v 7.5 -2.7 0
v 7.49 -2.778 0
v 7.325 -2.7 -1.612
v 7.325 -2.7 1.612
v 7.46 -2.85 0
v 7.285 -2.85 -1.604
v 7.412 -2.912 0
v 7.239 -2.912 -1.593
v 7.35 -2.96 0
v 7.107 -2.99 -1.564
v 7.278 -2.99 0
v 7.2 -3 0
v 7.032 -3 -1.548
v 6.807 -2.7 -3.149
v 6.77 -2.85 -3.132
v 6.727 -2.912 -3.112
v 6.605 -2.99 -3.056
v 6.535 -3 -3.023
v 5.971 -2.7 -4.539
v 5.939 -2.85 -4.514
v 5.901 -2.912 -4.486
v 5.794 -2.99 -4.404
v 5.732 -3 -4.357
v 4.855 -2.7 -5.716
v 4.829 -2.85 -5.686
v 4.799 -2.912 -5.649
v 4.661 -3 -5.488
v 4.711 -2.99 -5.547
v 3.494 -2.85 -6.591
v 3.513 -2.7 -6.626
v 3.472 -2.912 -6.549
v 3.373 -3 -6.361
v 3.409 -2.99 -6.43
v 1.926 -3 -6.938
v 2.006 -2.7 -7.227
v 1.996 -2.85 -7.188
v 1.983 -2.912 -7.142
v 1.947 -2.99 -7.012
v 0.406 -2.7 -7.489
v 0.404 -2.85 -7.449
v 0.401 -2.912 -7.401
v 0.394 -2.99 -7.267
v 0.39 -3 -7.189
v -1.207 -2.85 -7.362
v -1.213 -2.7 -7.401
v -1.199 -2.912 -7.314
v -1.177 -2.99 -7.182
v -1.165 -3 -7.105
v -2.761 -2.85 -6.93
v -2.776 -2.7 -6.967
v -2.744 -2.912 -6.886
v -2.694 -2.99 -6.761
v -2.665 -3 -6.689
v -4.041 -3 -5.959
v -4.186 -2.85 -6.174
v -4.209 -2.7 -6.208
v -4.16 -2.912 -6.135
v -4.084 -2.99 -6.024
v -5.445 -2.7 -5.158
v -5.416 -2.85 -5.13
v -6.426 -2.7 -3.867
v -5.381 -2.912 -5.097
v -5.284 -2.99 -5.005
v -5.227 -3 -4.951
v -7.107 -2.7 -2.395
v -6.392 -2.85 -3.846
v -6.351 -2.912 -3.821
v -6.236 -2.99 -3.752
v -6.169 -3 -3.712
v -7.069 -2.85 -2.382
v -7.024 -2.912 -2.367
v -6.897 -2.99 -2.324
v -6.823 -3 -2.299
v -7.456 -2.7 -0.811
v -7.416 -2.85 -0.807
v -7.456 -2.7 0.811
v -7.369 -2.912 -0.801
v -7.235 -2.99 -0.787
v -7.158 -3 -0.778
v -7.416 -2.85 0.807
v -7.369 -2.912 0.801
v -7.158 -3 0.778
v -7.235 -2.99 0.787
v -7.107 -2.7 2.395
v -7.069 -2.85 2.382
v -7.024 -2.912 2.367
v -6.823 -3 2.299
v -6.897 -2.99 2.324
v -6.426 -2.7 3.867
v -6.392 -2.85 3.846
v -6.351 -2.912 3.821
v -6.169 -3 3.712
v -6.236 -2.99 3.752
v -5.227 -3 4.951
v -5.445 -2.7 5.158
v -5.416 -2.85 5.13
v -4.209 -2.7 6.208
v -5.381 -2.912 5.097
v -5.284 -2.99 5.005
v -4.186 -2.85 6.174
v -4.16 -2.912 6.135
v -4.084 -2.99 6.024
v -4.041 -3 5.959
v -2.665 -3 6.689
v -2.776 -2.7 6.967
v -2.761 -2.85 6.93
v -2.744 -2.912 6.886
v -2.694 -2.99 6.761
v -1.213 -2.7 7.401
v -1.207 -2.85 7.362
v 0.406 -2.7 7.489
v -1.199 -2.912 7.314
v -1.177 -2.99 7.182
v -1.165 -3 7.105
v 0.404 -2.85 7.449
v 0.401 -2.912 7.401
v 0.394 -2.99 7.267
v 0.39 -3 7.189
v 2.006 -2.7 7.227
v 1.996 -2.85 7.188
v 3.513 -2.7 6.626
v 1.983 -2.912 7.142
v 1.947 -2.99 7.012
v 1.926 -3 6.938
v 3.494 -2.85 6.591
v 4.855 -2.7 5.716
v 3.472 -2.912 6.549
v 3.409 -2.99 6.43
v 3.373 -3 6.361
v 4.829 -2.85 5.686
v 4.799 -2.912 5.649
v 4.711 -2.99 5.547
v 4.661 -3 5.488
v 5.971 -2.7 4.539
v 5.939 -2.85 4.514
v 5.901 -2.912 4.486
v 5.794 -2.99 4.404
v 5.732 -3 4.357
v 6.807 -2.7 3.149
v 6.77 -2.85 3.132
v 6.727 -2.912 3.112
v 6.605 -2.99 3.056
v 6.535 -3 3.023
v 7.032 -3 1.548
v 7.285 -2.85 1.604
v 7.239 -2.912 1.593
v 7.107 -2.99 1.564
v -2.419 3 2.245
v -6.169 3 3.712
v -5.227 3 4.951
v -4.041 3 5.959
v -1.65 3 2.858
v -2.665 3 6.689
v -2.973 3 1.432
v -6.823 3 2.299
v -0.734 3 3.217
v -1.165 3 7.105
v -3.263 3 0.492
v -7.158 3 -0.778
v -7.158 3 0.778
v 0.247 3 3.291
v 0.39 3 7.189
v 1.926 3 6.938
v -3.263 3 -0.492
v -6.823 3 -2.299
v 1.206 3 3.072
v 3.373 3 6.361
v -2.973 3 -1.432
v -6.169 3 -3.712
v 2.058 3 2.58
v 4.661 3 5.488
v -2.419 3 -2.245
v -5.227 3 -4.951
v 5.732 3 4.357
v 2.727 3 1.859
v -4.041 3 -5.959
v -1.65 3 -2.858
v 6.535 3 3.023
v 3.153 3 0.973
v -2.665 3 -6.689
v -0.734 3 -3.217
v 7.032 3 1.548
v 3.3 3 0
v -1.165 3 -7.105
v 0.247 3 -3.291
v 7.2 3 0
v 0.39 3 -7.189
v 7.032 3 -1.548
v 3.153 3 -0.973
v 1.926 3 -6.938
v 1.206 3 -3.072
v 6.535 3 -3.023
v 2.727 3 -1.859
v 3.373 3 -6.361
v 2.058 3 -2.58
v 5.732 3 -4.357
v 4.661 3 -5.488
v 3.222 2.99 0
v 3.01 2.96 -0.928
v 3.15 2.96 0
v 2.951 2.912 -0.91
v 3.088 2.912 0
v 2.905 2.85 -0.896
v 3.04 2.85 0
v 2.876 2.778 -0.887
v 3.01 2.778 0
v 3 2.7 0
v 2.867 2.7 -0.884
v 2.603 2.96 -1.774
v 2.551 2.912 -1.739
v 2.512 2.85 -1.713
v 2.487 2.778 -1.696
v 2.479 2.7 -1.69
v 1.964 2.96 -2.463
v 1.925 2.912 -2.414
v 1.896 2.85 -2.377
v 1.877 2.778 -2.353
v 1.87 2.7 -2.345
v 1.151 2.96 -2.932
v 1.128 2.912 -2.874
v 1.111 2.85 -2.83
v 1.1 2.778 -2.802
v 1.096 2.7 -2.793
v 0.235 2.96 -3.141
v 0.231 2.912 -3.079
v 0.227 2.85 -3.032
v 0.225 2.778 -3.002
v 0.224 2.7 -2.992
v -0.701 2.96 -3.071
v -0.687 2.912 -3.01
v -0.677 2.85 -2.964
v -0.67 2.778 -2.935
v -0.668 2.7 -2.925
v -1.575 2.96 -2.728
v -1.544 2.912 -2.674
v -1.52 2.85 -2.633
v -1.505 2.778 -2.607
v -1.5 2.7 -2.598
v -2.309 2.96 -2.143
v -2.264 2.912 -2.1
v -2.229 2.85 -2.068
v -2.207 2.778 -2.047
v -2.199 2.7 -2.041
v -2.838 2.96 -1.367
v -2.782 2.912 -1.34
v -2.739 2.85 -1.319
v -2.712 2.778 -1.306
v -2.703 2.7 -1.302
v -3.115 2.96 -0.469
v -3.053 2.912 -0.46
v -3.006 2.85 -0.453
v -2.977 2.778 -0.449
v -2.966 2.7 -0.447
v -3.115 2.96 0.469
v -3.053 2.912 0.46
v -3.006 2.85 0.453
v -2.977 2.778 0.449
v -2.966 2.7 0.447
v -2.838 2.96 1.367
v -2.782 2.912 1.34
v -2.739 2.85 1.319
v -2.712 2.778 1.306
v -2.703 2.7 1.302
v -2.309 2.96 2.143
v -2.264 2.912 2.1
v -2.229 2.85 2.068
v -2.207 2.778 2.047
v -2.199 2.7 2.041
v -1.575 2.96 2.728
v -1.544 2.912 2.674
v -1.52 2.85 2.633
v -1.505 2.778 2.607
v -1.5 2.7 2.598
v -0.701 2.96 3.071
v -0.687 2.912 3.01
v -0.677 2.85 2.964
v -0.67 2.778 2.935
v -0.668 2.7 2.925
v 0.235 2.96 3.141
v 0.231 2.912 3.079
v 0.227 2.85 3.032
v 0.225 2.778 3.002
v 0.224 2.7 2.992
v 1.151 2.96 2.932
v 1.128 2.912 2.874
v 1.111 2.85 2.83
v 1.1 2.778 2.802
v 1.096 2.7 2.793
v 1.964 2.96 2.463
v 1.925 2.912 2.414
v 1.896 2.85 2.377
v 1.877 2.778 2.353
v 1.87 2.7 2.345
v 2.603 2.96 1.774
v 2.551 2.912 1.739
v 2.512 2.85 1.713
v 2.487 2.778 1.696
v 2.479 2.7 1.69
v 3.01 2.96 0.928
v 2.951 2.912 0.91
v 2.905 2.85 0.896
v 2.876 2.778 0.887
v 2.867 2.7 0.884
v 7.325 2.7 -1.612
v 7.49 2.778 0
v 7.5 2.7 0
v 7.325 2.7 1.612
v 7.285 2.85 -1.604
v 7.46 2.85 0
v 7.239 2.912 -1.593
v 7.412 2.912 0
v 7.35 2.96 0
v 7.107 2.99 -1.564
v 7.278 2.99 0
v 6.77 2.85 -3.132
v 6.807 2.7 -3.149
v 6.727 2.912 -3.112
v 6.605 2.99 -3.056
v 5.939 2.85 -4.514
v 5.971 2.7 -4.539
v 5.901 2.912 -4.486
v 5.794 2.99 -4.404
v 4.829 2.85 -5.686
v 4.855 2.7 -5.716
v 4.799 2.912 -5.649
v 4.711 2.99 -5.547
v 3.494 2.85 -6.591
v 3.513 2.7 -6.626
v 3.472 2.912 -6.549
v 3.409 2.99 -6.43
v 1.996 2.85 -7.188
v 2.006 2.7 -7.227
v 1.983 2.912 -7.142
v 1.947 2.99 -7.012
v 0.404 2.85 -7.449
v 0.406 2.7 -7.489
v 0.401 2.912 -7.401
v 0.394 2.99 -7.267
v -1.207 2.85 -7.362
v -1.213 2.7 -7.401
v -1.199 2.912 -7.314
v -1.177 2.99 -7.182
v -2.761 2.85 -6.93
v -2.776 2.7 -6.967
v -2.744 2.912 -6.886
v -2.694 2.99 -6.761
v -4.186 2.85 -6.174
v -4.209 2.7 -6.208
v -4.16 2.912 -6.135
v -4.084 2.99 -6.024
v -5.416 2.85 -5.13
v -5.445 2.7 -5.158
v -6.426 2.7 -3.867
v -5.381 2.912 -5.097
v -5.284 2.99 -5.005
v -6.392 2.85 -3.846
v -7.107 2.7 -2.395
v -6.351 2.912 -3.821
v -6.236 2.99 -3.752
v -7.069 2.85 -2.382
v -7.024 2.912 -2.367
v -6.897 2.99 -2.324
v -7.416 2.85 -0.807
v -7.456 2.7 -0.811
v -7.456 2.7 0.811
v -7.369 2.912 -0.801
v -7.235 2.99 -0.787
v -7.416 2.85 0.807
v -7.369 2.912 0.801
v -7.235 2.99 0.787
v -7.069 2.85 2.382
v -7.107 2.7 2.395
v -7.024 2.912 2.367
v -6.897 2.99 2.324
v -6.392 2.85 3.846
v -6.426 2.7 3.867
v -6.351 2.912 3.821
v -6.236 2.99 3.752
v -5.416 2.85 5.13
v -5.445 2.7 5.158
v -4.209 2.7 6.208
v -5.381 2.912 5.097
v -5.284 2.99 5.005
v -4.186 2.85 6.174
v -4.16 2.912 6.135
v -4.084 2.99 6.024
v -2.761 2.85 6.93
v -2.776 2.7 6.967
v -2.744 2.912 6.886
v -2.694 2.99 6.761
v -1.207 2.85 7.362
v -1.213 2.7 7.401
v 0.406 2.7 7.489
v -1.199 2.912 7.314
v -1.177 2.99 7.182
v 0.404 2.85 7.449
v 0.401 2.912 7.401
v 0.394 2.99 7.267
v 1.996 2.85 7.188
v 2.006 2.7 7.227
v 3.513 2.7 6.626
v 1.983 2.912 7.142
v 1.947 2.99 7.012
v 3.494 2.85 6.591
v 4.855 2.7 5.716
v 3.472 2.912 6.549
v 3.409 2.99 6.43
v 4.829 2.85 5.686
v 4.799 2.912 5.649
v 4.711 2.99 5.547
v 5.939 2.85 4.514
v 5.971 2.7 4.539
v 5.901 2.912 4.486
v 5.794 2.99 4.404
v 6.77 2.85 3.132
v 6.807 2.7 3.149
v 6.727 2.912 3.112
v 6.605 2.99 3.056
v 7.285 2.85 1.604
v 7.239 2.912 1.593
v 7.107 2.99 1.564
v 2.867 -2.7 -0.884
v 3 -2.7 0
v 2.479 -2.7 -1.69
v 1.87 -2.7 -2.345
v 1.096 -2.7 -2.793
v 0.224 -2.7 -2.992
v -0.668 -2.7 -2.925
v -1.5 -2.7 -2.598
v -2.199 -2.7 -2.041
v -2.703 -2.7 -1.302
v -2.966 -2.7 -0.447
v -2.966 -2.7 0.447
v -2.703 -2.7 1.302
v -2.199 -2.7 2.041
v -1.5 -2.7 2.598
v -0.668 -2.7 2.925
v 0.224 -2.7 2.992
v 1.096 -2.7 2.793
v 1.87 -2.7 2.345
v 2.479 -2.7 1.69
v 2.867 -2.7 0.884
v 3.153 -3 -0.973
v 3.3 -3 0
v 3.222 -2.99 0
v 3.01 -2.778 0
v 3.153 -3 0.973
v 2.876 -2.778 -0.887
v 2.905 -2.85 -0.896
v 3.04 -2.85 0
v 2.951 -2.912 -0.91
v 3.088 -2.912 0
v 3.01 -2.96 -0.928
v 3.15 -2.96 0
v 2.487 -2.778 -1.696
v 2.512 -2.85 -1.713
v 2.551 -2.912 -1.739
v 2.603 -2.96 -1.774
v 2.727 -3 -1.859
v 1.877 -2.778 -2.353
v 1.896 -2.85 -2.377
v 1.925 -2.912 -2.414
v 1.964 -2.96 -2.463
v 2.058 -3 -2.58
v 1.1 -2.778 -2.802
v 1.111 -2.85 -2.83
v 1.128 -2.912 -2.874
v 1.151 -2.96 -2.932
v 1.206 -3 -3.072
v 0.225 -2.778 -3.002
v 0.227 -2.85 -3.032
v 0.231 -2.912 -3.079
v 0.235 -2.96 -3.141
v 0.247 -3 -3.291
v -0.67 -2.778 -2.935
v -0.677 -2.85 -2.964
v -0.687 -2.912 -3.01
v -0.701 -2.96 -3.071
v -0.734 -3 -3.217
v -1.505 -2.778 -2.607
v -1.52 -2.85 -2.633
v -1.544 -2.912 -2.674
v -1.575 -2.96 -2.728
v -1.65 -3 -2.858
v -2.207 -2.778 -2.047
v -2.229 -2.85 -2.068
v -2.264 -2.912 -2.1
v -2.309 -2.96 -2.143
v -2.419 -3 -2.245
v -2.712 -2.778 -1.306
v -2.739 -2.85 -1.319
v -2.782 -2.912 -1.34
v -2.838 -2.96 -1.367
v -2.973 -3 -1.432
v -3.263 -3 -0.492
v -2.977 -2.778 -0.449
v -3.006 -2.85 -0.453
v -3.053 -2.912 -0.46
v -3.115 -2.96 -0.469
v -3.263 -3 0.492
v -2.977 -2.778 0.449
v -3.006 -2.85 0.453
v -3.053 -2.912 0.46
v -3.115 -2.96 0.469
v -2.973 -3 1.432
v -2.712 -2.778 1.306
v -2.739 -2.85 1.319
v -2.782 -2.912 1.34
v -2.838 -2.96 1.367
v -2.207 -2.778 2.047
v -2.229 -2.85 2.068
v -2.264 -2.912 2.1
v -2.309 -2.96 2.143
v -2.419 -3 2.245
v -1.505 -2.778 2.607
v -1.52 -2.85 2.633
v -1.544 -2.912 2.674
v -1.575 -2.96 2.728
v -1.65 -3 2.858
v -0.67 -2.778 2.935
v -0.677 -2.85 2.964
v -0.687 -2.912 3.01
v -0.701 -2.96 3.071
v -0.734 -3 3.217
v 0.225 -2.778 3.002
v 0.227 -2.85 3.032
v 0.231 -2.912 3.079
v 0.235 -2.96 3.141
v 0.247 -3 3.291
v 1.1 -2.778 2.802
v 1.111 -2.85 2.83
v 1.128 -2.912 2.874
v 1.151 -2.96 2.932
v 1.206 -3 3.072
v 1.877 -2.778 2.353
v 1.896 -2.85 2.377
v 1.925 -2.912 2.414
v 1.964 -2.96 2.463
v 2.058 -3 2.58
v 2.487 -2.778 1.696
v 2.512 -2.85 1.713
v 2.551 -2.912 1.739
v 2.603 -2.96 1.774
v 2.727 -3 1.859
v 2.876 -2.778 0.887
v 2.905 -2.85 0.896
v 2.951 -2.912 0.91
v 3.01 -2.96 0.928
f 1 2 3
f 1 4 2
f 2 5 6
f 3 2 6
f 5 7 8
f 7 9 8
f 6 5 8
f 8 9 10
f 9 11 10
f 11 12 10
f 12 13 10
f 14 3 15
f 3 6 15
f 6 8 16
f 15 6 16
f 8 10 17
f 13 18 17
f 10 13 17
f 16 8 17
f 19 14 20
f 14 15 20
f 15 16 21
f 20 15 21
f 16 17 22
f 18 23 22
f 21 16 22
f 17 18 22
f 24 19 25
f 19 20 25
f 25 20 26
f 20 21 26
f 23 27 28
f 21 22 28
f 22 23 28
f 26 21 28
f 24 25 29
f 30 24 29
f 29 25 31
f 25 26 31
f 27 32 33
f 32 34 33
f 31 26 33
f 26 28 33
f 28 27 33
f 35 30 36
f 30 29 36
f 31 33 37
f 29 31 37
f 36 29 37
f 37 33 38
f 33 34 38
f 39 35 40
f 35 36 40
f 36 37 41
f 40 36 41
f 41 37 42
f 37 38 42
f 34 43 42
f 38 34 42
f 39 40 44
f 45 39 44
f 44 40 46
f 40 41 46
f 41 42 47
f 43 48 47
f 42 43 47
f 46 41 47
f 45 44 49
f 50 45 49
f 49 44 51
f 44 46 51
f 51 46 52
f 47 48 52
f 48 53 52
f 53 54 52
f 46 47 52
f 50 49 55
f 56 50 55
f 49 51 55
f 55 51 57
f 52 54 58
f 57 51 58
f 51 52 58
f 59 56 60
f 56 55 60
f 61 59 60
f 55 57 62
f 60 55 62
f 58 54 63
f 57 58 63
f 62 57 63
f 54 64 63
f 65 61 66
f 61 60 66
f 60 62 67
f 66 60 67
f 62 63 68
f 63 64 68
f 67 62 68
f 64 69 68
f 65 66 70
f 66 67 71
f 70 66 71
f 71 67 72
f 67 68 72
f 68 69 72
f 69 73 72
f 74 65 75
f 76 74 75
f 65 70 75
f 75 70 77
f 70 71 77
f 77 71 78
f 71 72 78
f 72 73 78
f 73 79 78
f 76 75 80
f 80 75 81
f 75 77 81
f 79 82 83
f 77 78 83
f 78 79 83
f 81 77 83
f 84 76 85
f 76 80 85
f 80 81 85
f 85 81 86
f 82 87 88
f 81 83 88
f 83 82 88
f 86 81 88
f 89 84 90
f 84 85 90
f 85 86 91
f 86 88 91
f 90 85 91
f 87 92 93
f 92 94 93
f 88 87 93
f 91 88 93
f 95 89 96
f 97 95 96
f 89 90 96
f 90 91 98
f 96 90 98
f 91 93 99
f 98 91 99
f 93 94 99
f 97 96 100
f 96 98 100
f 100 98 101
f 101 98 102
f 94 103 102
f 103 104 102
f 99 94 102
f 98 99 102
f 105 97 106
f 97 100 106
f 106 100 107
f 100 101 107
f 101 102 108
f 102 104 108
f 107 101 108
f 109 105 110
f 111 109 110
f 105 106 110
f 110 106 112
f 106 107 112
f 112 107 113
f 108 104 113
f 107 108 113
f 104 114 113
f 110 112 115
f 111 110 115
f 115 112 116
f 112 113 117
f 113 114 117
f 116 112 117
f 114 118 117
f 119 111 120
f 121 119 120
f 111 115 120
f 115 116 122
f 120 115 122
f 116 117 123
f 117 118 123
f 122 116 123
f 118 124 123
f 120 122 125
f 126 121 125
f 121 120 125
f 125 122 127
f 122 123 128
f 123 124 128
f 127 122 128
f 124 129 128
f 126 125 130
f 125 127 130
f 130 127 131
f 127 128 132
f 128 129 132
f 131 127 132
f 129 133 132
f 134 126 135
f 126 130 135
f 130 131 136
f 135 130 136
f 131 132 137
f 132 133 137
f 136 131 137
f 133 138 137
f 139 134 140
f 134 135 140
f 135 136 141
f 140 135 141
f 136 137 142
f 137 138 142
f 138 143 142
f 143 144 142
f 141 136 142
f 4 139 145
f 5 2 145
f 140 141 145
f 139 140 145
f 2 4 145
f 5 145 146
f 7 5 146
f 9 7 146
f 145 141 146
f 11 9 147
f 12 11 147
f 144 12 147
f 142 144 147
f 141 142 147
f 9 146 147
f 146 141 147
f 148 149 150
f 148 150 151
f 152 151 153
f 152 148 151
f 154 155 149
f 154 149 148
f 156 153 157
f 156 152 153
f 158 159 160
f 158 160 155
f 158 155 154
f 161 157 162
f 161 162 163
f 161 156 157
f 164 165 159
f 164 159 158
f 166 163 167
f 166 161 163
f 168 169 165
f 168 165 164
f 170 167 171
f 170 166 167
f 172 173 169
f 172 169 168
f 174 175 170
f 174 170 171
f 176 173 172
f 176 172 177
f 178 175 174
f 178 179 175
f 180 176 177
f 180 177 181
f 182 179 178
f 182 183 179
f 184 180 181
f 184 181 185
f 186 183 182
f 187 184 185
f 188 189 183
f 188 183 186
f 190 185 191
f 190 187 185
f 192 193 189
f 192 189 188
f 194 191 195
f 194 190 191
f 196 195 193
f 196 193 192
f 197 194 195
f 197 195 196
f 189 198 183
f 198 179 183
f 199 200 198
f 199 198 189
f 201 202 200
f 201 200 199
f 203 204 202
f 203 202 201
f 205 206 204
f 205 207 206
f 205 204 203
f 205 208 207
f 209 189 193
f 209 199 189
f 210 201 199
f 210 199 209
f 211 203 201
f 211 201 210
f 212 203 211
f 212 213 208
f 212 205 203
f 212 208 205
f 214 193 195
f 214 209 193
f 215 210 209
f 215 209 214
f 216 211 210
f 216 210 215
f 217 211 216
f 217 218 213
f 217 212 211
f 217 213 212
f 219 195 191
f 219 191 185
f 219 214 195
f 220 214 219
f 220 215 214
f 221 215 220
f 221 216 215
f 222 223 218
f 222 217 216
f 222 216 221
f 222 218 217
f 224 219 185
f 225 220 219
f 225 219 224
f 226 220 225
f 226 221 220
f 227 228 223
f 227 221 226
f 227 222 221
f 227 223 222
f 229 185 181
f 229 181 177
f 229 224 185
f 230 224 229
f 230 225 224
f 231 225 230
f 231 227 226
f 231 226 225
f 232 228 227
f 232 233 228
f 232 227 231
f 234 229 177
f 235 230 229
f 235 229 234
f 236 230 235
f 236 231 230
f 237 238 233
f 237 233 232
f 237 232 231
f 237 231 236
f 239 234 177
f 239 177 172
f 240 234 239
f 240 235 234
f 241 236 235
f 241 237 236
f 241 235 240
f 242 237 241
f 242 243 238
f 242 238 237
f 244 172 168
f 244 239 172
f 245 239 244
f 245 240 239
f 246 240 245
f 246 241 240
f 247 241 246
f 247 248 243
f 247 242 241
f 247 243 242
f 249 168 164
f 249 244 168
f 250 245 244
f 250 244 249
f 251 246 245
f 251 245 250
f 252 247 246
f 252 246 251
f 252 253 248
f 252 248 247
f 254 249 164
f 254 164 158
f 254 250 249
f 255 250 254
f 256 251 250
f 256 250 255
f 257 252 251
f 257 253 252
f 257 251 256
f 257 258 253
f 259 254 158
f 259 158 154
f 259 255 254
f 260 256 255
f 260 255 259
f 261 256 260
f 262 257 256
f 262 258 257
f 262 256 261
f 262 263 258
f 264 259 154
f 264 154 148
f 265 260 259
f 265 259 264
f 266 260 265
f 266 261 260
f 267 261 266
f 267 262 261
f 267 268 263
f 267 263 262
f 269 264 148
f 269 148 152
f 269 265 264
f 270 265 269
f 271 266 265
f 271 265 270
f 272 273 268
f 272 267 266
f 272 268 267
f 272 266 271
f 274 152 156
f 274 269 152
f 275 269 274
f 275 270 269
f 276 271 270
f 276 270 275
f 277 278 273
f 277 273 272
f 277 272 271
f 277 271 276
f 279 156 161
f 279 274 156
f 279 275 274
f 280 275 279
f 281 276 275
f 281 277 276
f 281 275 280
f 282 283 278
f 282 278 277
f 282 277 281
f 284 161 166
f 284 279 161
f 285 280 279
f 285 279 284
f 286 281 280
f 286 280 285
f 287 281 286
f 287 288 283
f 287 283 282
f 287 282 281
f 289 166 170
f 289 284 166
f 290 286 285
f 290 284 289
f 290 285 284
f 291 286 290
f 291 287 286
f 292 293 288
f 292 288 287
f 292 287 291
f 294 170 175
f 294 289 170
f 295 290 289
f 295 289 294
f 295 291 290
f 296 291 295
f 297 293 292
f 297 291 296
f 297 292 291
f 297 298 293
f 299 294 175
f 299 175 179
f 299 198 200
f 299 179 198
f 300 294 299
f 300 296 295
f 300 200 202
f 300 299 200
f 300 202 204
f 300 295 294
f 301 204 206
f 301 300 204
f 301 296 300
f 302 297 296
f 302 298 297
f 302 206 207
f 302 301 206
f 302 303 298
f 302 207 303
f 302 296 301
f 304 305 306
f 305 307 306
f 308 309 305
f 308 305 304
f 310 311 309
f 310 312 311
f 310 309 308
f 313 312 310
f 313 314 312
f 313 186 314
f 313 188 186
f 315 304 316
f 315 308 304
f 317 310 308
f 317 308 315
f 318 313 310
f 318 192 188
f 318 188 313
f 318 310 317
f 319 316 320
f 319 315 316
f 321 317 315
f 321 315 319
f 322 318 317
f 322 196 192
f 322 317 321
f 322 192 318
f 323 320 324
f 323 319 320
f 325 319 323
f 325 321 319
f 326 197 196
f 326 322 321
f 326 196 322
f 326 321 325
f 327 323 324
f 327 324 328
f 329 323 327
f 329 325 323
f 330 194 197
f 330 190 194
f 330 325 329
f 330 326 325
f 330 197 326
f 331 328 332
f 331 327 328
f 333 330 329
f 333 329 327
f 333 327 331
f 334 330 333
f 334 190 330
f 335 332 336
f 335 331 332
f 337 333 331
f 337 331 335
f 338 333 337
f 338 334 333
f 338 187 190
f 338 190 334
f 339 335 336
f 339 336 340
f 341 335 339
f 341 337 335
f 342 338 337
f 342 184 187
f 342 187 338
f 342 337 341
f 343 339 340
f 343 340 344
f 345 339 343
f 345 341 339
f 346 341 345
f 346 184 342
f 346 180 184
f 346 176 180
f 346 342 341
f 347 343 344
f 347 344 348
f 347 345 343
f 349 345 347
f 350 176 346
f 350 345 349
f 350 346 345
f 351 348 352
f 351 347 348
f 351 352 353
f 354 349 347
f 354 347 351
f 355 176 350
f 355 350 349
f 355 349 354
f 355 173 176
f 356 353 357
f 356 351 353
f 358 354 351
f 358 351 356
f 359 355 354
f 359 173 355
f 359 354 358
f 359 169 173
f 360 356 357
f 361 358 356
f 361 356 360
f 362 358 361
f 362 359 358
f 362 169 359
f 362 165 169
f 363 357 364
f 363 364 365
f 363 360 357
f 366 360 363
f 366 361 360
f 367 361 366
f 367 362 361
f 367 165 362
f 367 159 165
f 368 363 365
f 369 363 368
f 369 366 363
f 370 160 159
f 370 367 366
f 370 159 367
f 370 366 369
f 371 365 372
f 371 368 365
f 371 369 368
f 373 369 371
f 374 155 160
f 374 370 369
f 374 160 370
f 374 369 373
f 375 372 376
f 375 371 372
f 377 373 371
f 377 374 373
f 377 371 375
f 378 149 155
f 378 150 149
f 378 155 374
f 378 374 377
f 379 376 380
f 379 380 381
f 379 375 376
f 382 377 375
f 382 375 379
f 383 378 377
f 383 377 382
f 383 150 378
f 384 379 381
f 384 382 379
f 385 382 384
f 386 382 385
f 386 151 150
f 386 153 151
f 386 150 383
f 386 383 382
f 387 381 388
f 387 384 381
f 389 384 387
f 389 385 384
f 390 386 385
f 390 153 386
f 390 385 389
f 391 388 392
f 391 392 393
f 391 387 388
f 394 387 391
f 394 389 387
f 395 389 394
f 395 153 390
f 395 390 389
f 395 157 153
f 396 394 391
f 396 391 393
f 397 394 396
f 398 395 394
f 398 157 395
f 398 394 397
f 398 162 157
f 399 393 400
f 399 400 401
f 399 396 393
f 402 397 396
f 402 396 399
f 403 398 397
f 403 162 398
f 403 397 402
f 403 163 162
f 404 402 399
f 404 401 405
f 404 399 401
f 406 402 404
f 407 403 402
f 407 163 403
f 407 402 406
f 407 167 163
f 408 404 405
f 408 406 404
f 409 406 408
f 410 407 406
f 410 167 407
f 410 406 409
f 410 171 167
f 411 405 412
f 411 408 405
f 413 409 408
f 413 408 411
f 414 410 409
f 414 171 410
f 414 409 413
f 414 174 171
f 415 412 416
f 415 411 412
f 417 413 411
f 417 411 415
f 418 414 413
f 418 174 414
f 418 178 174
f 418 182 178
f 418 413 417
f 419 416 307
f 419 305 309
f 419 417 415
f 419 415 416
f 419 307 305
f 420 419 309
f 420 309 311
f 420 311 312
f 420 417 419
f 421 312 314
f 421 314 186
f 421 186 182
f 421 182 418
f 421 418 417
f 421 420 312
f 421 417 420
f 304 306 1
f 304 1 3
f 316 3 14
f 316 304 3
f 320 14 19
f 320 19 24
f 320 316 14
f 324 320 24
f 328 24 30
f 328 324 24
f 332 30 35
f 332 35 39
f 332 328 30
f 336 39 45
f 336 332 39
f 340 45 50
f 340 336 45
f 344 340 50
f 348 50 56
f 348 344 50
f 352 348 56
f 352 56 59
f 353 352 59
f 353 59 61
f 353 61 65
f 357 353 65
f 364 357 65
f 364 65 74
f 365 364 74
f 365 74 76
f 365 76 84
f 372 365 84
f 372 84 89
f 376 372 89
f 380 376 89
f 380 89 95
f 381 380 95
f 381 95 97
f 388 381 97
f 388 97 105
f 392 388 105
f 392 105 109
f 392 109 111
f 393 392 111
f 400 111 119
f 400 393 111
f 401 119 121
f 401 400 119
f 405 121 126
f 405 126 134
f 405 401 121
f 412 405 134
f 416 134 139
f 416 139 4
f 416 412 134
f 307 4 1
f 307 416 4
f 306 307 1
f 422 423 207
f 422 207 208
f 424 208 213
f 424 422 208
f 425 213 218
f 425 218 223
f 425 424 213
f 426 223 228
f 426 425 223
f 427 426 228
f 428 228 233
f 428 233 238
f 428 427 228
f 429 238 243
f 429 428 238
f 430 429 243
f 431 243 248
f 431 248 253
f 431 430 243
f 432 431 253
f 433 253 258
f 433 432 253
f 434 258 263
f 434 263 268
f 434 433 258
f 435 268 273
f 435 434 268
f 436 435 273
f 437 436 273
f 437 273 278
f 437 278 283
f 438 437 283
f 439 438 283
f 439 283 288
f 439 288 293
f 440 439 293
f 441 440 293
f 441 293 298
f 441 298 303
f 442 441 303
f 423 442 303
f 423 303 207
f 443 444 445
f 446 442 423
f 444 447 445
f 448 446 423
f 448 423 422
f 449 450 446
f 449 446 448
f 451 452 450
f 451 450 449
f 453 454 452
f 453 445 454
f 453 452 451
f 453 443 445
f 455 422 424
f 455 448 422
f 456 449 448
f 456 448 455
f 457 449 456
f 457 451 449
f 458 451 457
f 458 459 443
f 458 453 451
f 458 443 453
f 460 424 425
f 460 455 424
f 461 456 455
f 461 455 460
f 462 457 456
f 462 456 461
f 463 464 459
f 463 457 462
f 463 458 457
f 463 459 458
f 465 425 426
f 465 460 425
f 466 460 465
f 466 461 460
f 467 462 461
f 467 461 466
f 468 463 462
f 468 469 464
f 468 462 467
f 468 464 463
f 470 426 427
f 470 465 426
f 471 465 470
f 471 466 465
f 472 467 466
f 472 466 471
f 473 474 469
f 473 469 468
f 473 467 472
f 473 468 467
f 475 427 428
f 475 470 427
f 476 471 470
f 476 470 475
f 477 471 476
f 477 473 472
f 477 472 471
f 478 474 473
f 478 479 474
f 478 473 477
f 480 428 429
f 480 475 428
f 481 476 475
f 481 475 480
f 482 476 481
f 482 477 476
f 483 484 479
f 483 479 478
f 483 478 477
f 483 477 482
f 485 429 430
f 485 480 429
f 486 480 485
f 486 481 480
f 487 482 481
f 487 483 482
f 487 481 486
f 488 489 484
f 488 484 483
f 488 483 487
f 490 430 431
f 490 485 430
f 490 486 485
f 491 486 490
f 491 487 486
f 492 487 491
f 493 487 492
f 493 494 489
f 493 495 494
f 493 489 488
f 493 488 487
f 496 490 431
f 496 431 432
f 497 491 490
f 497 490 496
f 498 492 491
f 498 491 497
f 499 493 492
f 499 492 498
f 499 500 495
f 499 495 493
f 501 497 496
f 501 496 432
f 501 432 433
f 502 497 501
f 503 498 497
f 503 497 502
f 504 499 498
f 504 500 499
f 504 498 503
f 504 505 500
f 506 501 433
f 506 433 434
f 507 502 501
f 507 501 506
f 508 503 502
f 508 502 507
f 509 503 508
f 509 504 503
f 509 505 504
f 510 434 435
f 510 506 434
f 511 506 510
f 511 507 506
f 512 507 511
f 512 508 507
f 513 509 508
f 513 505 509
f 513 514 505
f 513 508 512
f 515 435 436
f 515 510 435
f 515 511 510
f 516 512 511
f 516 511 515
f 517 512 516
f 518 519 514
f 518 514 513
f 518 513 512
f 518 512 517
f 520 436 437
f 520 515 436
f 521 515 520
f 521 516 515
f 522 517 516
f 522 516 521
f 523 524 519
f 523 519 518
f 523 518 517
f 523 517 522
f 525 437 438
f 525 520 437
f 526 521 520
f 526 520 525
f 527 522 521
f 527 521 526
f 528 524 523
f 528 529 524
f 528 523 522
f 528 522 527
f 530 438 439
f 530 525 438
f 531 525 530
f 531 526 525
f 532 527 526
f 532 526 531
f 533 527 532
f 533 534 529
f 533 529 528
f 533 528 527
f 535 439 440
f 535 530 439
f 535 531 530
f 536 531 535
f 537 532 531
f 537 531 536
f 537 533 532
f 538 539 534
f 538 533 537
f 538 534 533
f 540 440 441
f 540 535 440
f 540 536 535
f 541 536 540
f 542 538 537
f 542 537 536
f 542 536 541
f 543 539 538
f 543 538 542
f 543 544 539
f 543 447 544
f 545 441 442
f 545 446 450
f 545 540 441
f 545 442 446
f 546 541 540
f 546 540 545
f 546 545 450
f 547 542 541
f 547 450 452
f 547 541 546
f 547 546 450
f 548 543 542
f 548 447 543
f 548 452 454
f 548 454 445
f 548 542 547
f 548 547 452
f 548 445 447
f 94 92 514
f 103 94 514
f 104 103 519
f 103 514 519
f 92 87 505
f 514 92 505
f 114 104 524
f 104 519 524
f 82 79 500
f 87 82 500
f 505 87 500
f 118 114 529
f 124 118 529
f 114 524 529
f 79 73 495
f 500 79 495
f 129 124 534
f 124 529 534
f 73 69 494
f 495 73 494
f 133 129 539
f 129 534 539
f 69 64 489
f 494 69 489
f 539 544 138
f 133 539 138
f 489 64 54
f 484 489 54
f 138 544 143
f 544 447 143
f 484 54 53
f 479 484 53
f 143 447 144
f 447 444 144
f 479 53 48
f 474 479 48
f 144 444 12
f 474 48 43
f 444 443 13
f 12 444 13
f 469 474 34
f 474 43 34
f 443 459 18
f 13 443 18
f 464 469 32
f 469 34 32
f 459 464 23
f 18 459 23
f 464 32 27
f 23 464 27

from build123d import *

# Parameters (mm, degrees)
SKETCH1_R           = 7.5
SKETCH1_R_2         = 3
BOSS_EXTRUDE1_DEPTH = 3
FILLET1_R           = 0.3


with BuildPart() as part:
    # Sketch1 → Boss-Extrude1 (new body, symmetric)
    with BuildSketch(Plane(origin=(0, 0, 0), x_dir=(1, 0, 0), z_dir=(0, 1, 0))):
        Circle(SKETCH1_R)
        Circle(SKETCH1_R_2, mode=Mode.SUBTRACT)
    extrude(amount=BOSS_EXTRUDE1_DEPTH, both=True)

    # Fillet1
    fillet1_edges = [part.edges().sort_by_distance(p)[0] for p in [
        (-7.5, -3, 0),
        (-7.5, 3, 0),
        (-3, -3, 0),
        (-3, 3, 0),
    ]]
    fillet(fillet1_edges, radius=FILLET1_R)


solid = part.part
